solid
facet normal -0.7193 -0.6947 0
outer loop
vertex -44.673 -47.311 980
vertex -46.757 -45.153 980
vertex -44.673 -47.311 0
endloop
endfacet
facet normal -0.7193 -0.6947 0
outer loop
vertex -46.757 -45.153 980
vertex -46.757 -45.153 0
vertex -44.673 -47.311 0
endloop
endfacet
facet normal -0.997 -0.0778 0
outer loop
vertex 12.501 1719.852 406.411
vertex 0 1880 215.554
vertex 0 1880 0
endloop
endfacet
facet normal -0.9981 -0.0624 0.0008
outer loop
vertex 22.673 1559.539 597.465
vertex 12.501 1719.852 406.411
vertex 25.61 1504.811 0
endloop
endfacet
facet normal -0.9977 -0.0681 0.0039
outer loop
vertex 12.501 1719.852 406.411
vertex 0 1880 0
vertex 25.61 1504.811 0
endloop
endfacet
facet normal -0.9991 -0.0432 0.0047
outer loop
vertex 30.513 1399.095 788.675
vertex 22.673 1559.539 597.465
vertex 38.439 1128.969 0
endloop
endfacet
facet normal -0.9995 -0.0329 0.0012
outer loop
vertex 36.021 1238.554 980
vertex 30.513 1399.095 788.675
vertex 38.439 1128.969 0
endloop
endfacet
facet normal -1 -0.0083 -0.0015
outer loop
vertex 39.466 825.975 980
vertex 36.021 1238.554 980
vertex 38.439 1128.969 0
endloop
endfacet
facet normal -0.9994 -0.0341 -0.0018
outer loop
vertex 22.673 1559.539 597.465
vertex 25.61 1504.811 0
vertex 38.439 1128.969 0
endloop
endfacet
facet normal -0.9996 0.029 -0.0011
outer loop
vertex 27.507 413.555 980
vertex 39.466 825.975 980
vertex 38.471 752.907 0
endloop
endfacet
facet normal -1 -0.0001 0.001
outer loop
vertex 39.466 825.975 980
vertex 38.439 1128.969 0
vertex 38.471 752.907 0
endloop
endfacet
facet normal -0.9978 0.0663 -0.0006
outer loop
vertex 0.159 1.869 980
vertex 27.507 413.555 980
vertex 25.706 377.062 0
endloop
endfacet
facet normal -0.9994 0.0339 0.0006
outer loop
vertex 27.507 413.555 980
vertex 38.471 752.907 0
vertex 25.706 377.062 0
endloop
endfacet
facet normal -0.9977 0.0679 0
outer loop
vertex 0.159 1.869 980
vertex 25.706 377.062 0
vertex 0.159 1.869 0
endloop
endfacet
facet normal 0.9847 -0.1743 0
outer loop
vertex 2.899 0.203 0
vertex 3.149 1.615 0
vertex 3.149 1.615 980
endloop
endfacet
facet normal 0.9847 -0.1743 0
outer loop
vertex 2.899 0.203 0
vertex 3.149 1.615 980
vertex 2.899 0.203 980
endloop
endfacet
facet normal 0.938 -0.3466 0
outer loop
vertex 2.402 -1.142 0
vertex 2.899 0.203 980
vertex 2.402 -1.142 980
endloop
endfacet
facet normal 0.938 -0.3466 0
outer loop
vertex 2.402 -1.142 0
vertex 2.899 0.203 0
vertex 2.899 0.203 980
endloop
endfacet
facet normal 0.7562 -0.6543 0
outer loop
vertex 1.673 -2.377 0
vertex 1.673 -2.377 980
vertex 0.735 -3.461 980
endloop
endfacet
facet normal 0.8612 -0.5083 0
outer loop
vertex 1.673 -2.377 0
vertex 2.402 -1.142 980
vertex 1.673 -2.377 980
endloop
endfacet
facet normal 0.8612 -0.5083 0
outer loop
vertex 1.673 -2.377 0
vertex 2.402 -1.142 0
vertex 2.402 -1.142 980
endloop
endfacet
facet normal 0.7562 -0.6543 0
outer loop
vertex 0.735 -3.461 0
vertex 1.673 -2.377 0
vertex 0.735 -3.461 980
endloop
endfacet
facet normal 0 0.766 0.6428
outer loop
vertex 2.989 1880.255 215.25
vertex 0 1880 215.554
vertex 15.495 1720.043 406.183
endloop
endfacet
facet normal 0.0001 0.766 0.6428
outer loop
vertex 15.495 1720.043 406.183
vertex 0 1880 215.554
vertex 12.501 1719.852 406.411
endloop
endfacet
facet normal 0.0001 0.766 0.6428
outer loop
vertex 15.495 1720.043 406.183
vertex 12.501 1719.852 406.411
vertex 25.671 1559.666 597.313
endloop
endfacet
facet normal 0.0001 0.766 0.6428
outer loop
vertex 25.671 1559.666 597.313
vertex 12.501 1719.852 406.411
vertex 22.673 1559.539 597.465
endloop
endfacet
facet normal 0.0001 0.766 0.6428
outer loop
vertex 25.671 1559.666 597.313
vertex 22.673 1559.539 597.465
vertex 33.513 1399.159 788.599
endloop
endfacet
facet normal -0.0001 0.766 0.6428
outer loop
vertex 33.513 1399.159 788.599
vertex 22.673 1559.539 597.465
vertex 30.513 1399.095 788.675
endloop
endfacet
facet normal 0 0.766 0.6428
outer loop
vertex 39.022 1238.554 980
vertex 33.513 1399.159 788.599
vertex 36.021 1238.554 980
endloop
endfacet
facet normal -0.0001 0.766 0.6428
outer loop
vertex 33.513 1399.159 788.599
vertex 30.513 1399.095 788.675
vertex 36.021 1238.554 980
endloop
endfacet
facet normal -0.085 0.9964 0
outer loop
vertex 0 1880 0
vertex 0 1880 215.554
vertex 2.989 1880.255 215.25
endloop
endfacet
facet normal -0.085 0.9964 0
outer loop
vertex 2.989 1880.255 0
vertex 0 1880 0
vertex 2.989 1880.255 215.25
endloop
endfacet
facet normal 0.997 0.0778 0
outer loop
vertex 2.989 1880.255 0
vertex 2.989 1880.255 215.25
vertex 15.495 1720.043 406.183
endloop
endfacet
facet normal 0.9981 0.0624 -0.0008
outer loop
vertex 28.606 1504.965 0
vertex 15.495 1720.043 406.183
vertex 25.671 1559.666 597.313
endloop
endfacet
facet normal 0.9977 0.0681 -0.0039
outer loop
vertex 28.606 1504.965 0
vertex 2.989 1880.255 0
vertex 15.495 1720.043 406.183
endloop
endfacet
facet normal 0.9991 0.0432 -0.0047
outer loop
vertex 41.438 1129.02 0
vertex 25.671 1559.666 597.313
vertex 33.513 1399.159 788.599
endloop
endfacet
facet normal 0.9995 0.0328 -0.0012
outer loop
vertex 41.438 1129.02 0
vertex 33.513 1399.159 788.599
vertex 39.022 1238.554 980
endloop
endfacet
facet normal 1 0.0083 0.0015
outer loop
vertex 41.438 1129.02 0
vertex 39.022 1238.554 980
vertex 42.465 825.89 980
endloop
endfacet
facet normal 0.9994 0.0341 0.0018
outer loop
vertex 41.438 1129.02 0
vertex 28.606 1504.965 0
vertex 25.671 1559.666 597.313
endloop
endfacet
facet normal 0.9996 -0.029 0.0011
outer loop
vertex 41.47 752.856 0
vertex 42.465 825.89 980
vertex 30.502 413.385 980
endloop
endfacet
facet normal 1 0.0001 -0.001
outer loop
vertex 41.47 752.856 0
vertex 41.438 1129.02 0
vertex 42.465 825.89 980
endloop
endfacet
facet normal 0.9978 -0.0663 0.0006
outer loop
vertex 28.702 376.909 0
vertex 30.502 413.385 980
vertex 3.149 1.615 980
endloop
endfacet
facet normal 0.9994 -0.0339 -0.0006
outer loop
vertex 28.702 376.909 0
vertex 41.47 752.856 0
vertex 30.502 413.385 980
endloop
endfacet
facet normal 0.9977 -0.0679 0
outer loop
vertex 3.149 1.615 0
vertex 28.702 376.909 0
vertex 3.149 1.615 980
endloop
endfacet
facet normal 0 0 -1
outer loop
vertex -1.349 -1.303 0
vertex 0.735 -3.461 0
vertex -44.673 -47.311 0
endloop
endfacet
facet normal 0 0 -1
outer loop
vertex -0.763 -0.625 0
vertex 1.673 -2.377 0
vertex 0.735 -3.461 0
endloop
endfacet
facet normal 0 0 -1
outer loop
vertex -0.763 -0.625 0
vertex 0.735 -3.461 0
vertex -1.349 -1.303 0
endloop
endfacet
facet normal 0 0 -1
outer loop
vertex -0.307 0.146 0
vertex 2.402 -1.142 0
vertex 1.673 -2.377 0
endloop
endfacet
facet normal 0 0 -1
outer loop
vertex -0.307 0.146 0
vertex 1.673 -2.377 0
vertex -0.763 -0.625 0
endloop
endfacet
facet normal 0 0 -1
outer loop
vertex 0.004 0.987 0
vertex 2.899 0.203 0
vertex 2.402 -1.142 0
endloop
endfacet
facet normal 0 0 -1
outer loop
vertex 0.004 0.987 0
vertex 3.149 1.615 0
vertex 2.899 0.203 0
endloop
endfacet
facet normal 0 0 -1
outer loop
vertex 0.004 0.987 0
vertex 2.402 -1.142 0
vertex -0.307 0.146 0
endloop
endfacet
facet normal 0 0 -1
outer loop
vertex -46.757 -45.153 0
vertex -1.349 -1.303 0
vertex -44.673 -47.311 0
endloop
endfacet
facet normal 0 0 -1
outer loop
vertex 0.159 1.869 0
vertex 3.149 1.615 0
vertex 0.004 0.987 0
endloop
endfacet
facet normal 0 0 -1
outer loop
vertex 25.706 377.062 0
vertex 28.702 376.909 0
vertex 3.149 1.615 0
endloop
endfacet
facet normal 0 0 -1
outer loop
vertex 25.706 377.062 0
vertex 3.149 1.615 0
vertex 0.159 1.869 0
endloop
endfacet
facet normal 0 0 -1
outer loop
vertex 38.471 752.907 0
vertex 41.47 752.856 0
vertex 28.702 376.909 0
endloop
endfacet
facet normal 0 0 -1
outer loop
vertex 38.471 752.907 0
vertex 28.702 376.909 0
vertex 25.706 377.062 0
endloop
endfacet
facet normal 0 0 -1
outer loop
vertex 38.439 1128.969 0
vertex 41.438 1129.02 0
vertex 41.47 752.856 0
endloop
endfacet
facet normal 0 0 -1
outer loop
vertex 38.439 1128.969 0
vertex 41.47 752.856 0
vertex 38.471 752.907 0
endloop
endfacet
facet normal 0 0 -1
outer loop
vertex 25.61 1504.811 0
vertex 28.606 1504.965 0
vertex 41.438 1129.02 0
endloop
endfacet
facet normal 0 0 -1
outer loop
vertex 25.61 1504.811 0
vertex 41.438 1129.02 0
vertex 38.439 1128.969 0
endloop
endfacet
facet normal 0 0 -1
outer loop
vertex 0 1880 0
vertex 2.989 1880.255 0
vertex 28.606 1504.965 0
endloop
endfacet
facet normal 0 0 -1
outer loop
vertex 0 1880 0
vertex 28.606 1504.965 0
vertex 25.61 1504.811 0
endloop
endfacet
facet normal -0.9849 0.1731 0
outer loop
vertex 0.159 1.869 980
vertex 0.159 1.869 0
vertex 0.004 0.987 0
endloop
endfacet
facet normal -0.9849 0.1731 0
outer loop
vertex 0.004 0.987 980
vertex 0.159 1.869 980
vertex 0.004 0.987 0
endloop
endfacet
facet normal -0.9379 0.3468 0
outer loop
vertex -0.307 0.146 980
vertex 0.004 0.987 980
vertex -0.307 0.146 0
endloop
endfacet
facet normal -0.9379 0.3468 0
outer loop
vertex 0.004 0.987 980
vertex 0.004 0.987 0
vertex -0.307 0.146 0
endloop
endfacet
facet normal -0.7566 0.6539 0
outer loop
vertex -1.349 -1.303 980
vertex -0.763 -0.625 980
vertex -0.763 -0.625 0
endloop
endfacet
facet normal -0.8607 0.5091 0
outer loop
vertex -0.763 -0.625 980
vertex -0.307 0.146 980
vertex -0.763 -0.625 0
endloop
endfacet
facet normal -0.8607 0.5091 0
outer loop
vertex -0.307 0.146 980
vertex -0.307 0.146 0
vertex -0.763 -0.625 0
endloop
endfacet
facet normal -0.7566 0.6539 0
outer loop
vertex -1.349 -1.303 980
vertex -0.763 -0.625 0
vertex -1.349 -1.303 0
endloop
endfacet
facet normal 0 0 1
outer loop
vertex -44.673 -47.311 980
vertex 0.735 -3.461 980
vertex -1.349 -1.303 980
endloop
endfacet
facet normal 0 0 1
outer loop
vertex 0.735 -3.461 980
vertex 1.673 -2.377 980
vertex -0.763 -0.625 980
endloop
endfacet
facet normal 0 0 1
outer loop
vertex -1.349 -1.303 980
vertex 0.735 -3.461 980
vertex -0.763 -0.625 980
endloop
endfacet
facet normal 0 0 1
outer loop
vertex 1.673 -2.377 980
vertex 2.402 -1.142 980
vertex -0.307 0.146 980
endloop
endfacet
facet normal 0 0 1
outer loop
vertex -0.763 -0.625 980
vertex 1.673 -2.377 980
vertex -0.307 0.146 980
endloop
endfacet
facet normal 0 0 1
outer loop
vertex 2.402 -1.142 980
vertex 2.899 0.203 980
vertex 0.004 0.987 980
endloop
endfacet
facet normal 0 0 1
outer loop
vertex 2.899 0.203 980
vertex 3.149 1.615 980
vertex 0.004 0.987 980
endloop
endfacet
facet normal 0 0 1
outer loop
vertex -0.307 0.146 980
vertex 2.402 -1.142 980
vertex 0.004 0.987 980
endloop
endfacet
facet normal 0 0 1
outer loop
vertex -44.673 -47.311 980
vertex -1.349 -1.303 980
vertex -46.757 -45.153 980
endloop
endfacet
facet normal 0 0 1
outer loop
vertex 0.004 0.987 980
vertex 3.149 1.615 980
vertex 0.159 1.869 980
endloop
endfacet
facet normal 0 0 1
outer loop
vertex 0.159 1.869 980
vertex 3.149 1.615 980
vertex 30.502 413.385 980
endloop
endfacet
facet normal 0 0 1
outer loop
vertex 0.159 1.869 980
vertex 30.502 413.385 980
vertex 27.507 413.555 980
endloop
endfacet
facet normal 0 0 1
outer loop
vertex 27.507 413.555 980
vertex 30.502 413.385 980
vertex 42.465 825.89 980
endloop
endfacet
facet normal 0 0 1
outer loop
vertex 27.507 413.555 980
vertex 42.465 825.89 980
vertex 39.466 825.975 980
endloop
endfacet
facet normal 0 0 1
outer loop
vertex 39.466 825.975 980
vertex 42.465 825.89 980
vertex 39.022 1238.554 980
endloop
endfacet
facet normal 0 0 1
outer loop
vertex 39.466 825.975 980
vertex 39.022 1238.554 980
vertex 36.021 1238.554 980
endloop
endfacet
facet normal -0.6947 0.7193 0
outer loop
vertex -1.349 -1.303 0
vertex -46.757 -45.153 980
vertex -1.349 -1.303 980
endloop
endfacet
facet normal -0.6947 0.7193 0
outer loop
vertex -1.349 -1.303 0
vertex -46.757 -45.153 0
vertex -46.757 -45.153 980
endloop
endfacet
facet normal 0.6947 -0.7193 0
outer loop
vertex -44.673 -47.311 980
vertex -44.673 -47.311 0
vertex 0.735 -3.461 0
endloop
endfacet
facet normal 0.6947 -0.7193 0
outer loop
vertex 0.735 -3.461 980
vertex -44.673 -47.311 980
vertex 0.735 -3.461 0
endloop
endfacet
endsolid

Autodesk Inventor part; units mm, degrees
ref_plane "YZ Plane" through (0, 0, 0) normal (1, 0, 0) x (0, 1, 0)
ref_plane "XZ Plane" through (0, 0, 0) normal (0, 1, 0) x (-1, 0, 0)
ref_plane "XY Plane" through (0, 0, 0) normal (0, 0, 1) x (1, 0, 0)
sketch "Sketch1" plane through (0, 0, 0) normal (0, 0, 1) x (1, 0, 0)
  line L0 (440.770723, -684.385341) -> (440.770723, -734.385341) construction
  line L1 (0, 47) -> (0, 0) construction
  arc A0 (0.159434, 1.869277) -> (0, 1880) centre (-11009.945504, 940) ccw
  arc A1 (0, 0) -> (0.159434, 1.869277) centre (-11009.945504, 940) ccw construction
  arc A2 (-1.349222, -1.302929) -> (0.159434, 1.869277) centre (-4.822514, 2.29377) ccw
  line L2 (-1.349222, -1.302929) -> (0, 0) construction
  line L3 (-46.757087, -45.152794) -> (-1.349222, -1.302929)
  line L4 (-41.190716, -50.91694) -> (-46.757087, -45.152794) construction
  line L5 (0, 0) -> (0, 1880) construction
  line L6 (0, 0) -> (1.875639, 0) construction
  dimension "d154" = 5
  dimension "d155" = 65
  dimension "d156" = 11050
  dimension "d157" = 136
  dimension "d158" = 1880
contour flange "Contour Flange2" sketch "Sketch1" thickness 3 bend radius 3 width 980 along (0, 0, 1) mid plane no both sides no wall seen from (-24.053155, -23.227861, 0) lies toward (0.6946584, -0.7193398, 0) curves L3 A2 A0
bend "Bend2"
corner "Corner2"
sketch "Sketch6" plane through (0, 0, 0) normal (1, 0, 0) x (0, 1, 0)
  line L0 (1.869277, 0) -> (1.869277, 980)
  line L1 (1880, 980) -> (1.869277, 980)
  line L2 (1.869277, 0) -> (1880, 0)
  line L3 (1880.255204, 980) -> (1880, 980)
  line L4 (1880.255204, 0) -> (1880.255204, 980)
  line L5 (1880.255204, 0) -> (1880, 0)
  line L6 (1238.553761, 0) -> (1880.255204, 764.75)
  line L7 (1880.255204, 215.25) -> (1238.553761, 980)
  point P0 (0, 0)
  dimension "d160" = 40
  dimension "d161" = 215.25
extrude "Extrusion3" cut sketch "Sketch6" along normal through all both and the other way through all contours L1 L3 L4 L6 L7 | L6 L4 L7
sketch "Sketch7" plane through (-1.349222, -1.302929, 980) normal (-0.6946584, 0.7193398, 0) x (0.7193398, 0.6946584, 0)
  line L0 (-83.025107, 17.798613) -> (-83.025107, 187.19296) construction
  line L1 (-83.025107, 187.19296) -> (-68.508178, 187.19296) construction
  line L2 (-68.508178, 187.19296) -> (-68.508178, 17.798613) construction
  line L3 (-68.508178, 17.798613) -> (-83.025107, 17.798613) construction
  point P0 (1.875639, 980)
feature "Mark5" [suppressed]
equation "\"d36\" = Thickness"
equation "\"d37\" = BendReliefWidth"
equation "\"d38\" = BendReliefDepth"
equation "\"d39\" = MinimumRemnant"
equation "\"d40\" = TransitionRadius"
equation "\"d42\" = BendRadius"
equation "\"d44\" = CornerReliefSize"
equation "\"d45\" = GapSize"
equation "\"d46\" = JacobiRadiusSize"
equation "\"BendRadius\" = Thickness"
equation "\"BendReliefWidth\" = Thickness"
equation "\"BendReliefDepth\" = 0.5 * Thickness"
equation "\"CornerReliefSize\" = 4 * Thickness"
equation "\"MinimumRemnant\" = 2 * Thickness"
equation "\"TransitionRadius\" = BendRadius"
equation "\"JacobiRadiusSize\" = BendRadius"
equation "\"GapSize\" = Thickness"
equation "\"Thickness\" = 3"
properties part number "MSC 310 sheet left board withers" material "AISI304"
